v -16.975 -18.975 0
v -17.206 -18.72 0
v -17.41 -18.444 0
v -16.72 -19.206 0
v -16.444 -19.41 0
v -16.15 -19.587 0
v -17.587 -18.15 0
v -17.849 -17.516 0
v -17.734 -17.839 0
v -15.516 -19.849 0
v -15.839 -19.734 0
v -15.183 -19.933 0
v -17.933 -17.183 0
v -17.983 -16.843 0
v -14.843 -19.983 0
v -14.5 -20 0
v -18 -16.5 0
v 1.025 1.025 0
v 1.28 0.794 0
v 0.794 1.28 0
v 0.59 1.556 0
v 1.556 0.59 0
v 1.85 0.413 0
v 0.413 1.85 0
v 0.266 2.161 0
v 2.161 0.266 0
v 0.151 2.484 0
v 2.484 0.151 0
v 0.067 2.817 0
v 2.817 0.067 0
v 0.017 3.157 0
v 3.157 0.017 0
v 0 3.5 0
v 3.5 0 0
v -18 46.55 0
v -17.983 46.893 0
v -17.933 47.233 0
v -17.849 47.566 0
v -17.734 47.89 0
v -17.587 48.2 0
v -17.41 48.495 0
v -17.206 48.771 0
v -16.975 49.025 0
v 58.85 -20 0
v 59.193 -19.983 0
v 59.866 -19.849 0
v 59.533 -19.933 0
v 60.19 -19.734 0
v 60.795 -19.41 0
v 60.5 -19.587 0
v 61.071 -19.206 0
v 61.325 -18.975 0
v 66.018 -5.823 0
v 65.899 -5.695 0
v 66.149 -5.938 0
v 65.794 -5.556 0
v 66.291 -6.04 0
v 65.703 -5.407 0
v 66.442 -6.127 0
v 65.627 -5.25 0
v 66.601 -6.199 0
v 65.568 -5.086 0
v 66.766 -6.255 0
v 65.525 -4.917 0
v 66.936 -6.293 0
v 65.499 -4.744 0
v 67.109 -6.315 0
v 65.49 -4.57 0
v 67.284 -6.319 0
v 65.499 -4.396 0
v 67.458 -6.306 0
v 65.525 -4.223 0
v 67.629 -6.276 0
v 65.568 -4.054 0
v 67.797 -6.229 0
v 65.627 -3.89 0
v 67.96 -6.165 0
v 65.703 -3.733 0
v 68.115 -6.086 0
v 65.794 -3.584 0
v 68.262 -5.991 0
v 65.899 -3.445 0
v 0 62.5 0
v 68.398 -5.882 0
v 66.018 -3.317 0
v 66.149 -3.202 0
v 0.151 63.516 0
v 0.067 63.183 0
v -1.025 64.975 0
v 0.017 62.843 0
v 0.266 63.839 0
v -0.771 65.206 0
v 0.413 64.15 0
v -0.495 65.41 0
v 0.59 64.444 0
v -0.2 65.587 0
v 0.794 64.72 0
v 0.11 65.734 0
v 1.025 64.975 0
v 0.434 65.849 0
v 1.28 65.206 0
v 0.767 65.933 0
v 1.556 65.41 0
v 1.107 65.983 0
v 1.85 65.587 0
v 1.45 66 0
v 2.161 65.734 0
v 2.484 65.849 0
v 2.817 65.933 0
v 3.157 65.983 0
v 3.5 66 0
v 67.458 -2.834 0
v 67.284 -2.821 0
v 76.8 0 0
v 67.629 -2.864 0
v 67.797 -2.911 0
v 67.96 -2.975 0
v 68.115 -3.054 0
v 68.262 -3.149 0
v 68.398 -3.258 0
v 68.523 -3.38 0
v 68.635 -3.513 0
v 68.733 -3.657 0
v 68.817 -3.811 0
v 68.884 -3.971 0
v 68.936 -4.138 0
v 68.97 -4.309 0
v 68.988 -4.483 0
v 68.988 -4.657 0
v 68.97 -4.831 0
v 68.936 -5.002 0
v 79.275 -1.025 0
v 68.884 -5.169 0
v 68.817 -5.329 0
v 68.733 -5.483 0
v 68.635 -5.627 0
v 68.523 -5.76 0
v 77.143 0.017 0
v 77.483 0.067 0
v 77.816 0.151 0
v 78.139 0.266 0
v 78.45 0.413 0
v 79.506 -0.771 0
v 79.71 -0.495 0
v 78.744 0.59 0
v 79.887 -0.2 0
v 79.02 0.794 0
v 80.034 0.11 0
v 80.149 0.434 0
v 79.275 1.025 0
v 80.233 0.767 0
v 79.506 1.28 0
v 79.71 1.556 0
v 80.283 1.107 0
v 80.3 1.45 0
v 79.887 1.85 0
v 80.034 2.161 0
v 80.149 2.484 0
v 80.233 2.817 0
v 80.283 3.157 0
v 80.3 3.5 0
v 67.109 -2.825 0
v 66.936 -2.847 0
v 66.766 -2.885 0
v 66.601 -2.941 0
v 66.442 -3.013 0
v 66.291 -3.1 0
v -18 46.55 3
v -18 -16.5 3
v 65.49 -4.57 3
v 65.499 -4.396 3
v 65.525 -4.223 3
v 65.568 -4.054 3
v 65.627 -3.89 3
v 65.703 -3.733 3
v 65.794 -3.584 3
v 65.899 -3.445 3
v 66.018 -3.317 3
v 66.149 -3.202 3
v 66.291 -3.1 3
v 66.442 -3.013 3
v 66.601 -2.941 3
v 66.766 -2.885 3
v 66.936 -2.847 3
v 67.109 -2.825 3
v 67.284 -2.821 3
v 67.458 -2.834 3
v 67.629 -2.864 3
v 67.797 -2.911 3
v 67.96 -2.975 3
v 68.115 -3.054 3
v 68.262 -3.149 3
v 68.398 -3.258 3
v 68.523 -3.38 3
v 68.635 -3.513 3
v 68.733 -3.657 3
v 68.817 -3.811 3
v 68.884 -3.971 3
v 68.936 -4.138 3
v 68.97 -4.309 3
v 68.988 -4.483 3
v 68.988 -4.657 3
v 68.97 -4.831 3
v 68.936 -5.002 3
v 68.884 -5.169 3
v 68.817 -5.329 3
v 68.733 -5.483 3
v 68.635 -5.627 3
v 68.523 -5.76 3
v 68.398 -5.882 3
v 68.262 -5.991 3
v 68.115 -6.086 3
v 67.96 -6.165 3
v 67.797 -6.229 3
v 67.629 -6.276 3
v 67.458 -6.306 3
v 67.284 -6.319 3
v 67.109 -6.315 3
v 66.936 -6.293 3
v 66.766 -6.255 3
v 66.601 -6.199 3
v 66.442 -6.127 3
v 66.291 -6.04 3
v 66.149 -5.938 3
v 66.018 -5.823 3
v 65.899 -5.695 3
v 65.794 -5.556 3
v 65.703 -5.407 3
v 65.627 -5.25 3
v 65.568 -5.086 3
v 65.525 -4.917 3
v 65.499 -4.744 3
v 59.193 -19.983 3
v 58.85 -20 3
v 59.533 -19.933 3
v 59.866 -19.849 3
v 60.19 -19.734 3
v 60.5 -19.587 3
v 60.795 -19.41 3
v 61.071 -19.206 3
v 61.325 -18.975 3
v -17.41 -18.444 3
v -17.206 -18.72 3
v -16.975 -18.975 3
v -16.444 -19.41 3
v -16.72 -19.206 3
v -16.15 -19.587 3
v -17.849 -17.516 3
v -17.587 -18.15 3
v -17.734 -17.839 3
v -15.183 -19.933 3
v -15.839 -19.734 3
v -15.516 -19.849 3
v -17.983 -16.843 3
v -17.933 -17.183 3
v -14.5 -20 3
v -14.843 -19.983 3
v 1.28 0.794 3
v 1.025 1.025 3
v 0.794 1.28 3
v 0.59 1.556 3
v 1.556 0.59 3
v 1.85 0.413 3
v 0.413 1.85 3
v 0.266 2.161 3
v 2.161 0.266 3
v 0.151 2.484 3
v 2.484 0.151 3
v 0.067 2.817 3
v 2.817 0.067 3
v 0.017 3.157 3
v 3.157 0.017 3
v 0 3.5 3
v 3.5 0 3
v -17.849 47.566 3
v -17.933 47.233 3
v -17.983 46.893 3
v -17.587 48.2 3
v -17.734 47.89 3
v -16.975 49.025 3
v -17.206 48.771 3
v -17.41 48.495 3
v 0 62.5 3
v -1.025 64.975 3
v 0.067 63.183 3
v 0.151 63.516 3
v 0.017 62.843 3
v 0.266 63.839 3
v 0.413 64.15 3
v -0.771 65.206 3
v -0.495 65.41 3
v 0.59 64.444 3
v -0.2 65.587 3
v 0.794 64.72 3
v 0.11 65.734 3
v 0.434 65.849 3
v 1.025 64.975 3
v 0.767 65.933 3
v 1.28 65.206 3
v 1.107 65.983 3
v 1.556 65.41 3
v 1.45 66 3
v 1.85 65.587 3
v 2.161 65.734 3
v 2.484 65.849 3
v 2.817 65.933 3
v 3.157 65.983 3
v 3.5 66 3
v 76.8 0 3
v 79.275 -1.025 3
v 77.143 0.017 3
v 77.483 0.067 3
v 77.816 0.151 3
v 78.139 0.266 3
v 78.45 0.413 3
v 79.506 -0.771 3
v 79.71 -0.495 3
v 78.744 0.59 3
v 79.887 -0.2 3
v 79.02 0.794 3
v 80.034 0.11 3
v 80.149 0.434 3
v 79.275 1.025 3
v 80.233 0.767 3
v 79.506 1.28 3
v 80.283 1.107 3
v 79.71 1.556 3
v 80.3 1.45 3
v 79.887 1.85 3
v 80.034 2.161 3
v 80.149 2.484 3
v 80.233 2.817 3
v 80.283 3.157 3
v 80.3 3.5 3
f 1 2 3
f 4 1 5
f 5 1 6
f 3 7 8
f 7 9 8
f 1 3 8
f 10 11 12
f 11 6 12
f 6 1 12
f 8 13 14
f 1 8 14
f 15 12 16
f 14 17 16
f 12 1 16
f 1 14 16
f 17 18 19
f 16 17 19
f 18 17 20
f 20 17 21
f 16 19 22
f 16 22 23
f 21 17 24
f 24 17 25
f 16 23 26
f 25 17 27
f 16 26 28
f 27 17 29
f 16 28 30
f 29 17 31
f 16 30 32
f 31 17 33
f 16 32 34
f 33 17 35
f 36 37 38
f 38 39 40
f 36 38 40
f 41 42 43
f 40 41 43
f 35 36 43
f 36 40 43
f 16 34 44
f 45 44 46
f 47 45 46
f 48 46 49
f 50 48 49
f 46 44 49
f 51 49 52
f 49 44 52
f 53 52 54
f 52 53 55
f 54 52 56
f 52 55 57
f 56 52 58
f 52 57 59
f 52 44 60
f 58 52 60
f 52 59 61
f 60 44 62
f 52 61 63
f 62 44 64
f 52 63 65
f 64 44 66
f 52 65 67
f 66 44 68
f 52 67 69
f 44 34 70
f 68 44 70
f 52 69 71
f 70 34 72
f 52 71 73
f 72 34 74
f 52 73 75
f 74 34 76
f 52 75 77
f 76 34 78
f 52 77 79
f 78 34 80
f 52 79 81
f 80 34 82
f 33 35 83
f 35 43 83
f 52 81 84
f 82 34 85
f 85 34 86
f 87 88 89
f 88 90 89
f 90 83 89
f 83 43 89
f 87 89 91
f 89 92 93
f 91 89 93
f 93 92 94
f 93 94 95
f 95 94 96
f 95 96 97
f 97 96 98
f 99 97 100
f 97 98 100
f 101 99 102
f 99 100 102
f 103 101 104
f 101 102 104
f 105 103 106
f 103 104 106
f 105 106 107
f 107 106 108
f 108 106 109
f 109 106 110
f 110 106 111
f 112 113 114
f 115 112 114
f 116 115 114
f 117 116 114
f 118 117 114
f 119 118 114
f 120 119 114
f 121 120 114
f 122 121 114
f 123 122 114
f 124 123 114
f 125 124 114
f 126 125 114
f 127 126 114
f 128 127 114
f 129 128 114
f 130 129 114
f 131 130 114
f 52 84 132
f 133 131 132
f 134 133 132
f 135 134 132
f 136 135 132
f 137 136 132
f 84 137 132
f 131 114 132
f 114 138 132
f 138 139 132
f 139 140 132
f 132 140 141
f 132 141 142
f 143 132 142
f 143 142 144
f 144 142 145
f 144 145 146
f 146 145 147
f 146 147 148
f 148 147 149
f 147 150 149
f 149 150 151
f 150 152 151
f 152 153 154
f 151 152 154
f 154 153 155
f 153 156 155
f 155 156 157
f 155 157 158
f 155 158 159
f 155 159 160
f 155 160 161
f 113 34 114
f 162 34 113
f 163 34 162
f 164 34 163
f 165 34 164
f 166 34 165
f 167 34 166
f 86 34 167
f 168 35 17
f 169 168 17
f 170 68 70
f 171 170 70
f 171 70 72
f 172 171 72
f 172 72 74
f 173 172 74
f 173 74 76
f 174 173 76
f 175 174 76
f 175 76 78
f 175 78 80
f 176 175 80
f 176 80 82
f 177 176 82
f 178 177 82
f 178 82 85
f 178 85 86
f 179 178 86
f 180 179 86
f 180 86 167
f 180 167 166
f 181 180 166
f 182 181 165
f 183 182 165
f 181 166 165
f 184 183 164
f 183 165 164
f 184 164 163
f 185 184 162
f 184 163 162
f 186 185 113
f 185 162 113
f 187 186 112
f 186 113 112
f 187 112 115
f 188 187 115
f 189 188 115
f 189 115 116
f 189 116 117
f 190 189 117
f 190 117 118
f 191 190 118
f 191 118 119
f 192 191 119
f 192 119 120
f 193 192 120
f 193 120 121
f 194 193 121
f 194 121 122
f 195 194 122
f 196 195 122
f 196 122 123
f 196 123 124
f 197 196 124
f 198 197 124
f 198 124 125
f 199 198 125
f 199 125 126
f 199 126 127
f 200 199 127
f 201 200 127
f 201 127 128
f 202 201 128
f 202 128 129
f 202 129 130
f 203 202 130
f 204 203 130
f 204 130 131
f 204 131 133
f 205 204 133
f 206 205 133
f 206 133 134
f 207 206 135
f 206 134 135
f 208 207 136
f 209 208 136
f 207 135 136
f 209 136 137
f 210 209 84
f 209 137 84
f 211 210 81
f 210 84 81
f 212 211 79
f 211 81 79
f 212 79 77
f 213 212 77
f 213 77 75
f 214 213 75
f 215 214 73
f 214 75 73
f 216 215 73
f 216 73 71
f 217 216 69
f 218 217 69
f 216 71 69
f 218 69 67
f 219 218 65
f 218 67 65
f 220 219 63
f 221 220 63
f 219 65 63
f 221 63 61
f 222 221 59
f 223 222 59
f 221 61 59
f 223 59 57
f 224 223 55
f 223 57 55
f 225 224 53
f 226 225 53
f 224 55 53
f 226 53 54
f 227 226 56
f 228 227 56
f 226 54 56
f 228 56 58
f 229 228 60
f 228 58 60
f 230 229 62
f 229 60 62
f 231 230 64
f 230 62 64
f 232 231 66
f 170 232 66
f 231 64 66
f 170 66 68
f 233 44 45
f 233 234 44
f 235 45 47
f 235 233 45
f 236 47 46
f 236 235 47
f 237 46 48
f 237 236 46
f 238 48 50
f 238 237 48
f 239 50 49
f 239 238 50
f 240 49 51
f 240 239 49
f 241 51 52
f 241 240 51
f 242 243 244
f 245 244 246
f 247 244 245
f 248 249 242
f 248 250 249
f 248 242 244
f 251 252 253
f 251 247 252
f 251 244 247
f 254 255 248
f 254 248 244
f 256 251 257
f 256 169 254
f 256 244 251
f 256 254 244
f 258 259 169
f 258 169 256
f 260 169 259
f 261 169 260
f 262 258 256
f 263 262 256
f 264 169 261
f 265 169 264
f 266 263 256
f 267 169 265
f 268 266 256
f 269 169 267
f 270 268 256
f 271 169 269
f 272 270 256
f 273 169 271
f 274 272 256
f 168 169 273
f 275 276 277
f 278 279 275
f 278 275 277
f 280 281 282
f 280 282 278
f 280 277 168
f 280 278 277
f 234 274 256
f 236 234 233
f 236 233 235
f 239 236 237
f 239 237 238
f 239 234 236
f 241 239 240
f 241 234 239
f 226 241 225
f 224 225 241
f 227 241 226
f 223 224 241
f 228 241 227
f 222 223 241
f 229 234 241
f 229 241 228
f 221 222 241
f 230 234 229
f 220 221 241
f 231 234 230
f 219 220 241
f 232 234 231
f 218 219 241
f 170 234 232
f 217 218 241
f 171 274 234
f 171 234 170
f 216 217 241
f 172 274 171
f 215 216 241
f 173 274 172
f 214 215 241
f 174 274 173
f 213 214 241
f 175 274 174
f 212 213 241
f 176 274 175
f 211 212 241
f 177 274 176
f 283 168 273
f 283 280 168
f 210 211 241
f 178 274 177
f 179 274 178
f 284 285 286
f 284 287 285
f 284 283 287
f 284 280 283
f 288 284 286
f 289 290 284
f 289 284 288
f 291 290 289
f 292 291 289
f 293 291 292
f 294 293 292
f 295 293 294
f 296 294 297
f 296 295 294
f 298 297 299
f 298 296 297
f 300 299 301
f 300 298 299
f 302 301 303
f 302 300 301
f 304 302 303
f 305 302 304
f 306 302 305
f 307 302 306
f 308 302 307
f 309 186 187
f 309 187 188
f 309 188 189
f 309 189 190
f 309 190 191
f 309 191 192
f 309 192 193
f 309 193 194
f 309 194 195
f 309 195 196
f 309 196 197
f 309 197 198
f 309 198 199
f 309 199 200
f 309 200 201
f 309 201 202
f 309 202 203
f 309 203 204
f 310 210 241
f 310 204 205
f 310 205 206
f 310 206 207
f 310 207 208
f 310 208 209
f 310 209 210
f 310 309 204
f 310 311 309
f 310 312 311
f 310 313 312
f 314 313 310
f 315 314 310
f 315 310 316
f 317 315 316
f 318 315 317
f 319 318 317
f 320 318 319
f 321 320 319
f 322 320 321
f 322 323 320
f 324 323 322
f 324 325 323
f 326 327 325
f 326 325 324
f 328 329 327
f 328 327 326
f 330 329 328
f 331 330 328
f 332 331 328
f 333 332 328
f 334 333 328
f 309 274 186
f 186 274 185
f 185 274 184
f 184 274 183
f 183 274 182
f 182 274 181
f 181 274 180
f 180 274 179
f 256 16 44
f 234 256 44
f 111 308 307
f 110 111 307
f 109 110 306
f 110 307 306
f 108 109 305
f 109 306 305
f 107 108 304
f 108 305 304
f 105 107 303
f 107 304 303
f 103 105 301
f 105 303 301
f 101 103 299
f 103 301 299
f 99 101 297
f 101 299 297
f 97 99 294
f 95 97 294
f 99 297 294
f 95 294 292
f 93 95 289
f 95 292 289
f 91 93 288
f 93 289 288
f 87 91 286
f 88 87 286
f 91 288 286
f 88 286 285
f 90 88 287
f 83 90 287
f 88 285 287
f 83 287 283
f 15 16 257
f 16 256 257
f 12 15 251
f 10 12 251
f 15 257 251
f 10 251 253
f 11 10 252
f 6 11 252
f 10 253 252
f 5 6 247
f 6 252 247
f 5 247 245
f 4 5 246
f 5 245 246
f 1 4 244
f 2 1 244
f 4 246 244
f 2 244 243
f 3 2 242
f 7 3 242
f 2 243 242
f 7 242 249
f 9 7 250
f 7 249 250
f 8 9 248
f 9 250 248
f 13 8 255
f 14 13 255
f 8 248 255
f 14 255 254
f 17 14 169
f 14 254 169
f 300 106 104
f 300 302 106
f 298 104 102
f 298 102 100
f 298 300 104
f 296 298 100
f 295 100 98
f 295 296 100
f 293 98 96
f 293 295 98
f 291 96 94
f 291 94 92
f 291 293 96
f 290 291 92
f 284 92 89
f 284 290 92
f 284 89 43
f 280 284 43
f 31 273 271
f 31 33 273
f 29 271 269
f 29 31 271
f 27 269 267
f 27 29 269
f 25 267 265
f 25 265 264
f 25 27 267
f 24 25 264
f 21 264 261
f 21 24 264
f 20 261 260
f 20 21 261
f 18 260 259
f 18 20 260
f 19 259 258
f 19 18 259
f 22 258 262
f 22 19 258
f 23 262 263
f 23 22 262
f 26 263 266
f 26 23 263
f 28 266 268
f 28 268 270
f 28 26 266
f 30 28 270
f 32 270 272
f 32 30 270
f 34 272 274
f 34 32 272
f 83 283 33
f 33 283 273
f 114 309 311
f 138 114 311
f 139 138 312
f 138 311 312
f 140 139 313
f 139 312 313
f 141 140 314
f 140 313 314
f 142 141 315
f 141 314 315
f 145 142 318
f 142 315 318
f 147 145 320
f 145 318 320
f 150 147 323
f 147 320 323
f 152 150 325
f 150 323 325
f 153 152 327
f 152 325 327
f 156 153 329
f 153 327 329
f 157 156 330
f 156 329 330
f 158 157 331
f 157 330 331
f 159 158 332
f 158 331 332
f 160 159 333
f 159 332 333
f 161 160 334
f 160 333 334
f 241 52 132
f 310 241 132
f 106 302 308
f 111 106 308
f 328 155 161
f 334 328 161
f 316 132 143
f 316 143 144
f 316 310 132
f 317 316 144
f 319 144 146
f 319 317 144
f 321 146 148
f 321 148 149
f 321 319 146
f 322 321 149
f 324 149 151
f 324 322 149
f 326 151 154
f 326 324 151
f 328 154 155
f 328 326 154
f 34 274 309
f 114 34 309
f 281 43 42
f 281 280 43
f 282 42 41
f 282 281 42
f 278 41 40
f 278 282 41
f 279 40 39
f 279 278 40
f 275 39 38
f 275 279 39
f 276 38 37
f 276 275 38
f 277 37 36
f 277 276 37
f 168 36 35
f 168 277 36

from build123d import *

# Parameters (mm, degrees)
SKETCH1_W                  = 80.3
SKETCH1_H                  = 66
BOSS_EXTRUDE1_DEPTH        = 3
FILLET1_R                  = 3.5
SKETCH2_R                  = 3.5
CUT_EXTRUDE1_DEPTH         = 4
FILLET2_R                  = 3.5
F_3_5_3_5_DIAMETER_HOLE1_D = 3.5


with BuildPart() as part:
    # Sketch1 → Boss-Extrude1 (new body)
    with BuildSketch(Plane.XY):
        Polygon((-18, -20), (60.3, -20), (80.3, 0), (0, 0), (0, 66), (-18, 48), align=None)
        with Locations((40.15, 33)):
            Rectangle(SKETCH1_W, SKETCH1_H)
    extrude(amount=BOSS_EXTRUDE1_DEPTH)

    # Fillet1
    fillet1_edges = [part.edges().sort_by_distance(p)[0] for p in [
        (60.3, -20, 1.5),
        (-18, -20, 1.5),
        (-18, 48, 1.5),
        (0, 66, 1.5),
        (80.3, 66, 1.5),
        (80.3, 0, 1.5),
    ]]
    fillet(fillet1_edges, radius=FILLET1_R)

    # Sketch2 → Cut-Extrude1 (cut, through all)
    with BuildSketch(Plane.XY.offset(3)):
        with BuildLine():
            Line((0, 62.5), (0, 0))
            Line((0, 0), (76.8, 0))
            ThreePointArc((76.8, 0), (74.325126266, 5.974873734), (80.3, 3.5))
            Line((80.3, 3.5), (80.3, 62.5))
            ThreePointArc((80.3, 62.5), (74.325126266, 60.025126266), (76.8, 66))
            Line((76.8, 66), (3.500000005, 66))
            ThreePointArc((3.500000005, 66), (5.974873736, 64.974873732), (7, 62.5))
            ThreePointArc((7, 62.5), (3.5, 59), (0, 62.5))
        make_face()
        with Locations((3.5, 62.5)):
            Circle(SKETCH2_R)
        with BuildLine():
            ThreePointArc((76.8, 66), (74.325126266, 60.025126266), (80.3, 62.5))
            ThreePointArc((80.3, 62.5), (79.274873734, 64.974873734), (76.8, 66))
        make_face()
        with Locations((76.8, 3.5)):
            Circle(SKETCH2_R)
    extrude(amount=-CUT_EXTRUDE1_DEPTH, mode=Mode.SUBTRACT)

    # Fillet2
    fillet2_edges = [part.edges().sort_by_distance(p)[0] for p in [
        (0, 0, 1.5),
    ]]
    fillet(fillet2_edges, radius=FILLET2_R)

    # Ø3.5 (3.5) Diameter Hole1 (through all)
    with Locations(Plane.XY.offset(3)):
        with Locations((67.24, -4.57)):
            Hole(F_3_5_3_5_DIAMETER_HOLE1_D / 2)


solid = part.part
